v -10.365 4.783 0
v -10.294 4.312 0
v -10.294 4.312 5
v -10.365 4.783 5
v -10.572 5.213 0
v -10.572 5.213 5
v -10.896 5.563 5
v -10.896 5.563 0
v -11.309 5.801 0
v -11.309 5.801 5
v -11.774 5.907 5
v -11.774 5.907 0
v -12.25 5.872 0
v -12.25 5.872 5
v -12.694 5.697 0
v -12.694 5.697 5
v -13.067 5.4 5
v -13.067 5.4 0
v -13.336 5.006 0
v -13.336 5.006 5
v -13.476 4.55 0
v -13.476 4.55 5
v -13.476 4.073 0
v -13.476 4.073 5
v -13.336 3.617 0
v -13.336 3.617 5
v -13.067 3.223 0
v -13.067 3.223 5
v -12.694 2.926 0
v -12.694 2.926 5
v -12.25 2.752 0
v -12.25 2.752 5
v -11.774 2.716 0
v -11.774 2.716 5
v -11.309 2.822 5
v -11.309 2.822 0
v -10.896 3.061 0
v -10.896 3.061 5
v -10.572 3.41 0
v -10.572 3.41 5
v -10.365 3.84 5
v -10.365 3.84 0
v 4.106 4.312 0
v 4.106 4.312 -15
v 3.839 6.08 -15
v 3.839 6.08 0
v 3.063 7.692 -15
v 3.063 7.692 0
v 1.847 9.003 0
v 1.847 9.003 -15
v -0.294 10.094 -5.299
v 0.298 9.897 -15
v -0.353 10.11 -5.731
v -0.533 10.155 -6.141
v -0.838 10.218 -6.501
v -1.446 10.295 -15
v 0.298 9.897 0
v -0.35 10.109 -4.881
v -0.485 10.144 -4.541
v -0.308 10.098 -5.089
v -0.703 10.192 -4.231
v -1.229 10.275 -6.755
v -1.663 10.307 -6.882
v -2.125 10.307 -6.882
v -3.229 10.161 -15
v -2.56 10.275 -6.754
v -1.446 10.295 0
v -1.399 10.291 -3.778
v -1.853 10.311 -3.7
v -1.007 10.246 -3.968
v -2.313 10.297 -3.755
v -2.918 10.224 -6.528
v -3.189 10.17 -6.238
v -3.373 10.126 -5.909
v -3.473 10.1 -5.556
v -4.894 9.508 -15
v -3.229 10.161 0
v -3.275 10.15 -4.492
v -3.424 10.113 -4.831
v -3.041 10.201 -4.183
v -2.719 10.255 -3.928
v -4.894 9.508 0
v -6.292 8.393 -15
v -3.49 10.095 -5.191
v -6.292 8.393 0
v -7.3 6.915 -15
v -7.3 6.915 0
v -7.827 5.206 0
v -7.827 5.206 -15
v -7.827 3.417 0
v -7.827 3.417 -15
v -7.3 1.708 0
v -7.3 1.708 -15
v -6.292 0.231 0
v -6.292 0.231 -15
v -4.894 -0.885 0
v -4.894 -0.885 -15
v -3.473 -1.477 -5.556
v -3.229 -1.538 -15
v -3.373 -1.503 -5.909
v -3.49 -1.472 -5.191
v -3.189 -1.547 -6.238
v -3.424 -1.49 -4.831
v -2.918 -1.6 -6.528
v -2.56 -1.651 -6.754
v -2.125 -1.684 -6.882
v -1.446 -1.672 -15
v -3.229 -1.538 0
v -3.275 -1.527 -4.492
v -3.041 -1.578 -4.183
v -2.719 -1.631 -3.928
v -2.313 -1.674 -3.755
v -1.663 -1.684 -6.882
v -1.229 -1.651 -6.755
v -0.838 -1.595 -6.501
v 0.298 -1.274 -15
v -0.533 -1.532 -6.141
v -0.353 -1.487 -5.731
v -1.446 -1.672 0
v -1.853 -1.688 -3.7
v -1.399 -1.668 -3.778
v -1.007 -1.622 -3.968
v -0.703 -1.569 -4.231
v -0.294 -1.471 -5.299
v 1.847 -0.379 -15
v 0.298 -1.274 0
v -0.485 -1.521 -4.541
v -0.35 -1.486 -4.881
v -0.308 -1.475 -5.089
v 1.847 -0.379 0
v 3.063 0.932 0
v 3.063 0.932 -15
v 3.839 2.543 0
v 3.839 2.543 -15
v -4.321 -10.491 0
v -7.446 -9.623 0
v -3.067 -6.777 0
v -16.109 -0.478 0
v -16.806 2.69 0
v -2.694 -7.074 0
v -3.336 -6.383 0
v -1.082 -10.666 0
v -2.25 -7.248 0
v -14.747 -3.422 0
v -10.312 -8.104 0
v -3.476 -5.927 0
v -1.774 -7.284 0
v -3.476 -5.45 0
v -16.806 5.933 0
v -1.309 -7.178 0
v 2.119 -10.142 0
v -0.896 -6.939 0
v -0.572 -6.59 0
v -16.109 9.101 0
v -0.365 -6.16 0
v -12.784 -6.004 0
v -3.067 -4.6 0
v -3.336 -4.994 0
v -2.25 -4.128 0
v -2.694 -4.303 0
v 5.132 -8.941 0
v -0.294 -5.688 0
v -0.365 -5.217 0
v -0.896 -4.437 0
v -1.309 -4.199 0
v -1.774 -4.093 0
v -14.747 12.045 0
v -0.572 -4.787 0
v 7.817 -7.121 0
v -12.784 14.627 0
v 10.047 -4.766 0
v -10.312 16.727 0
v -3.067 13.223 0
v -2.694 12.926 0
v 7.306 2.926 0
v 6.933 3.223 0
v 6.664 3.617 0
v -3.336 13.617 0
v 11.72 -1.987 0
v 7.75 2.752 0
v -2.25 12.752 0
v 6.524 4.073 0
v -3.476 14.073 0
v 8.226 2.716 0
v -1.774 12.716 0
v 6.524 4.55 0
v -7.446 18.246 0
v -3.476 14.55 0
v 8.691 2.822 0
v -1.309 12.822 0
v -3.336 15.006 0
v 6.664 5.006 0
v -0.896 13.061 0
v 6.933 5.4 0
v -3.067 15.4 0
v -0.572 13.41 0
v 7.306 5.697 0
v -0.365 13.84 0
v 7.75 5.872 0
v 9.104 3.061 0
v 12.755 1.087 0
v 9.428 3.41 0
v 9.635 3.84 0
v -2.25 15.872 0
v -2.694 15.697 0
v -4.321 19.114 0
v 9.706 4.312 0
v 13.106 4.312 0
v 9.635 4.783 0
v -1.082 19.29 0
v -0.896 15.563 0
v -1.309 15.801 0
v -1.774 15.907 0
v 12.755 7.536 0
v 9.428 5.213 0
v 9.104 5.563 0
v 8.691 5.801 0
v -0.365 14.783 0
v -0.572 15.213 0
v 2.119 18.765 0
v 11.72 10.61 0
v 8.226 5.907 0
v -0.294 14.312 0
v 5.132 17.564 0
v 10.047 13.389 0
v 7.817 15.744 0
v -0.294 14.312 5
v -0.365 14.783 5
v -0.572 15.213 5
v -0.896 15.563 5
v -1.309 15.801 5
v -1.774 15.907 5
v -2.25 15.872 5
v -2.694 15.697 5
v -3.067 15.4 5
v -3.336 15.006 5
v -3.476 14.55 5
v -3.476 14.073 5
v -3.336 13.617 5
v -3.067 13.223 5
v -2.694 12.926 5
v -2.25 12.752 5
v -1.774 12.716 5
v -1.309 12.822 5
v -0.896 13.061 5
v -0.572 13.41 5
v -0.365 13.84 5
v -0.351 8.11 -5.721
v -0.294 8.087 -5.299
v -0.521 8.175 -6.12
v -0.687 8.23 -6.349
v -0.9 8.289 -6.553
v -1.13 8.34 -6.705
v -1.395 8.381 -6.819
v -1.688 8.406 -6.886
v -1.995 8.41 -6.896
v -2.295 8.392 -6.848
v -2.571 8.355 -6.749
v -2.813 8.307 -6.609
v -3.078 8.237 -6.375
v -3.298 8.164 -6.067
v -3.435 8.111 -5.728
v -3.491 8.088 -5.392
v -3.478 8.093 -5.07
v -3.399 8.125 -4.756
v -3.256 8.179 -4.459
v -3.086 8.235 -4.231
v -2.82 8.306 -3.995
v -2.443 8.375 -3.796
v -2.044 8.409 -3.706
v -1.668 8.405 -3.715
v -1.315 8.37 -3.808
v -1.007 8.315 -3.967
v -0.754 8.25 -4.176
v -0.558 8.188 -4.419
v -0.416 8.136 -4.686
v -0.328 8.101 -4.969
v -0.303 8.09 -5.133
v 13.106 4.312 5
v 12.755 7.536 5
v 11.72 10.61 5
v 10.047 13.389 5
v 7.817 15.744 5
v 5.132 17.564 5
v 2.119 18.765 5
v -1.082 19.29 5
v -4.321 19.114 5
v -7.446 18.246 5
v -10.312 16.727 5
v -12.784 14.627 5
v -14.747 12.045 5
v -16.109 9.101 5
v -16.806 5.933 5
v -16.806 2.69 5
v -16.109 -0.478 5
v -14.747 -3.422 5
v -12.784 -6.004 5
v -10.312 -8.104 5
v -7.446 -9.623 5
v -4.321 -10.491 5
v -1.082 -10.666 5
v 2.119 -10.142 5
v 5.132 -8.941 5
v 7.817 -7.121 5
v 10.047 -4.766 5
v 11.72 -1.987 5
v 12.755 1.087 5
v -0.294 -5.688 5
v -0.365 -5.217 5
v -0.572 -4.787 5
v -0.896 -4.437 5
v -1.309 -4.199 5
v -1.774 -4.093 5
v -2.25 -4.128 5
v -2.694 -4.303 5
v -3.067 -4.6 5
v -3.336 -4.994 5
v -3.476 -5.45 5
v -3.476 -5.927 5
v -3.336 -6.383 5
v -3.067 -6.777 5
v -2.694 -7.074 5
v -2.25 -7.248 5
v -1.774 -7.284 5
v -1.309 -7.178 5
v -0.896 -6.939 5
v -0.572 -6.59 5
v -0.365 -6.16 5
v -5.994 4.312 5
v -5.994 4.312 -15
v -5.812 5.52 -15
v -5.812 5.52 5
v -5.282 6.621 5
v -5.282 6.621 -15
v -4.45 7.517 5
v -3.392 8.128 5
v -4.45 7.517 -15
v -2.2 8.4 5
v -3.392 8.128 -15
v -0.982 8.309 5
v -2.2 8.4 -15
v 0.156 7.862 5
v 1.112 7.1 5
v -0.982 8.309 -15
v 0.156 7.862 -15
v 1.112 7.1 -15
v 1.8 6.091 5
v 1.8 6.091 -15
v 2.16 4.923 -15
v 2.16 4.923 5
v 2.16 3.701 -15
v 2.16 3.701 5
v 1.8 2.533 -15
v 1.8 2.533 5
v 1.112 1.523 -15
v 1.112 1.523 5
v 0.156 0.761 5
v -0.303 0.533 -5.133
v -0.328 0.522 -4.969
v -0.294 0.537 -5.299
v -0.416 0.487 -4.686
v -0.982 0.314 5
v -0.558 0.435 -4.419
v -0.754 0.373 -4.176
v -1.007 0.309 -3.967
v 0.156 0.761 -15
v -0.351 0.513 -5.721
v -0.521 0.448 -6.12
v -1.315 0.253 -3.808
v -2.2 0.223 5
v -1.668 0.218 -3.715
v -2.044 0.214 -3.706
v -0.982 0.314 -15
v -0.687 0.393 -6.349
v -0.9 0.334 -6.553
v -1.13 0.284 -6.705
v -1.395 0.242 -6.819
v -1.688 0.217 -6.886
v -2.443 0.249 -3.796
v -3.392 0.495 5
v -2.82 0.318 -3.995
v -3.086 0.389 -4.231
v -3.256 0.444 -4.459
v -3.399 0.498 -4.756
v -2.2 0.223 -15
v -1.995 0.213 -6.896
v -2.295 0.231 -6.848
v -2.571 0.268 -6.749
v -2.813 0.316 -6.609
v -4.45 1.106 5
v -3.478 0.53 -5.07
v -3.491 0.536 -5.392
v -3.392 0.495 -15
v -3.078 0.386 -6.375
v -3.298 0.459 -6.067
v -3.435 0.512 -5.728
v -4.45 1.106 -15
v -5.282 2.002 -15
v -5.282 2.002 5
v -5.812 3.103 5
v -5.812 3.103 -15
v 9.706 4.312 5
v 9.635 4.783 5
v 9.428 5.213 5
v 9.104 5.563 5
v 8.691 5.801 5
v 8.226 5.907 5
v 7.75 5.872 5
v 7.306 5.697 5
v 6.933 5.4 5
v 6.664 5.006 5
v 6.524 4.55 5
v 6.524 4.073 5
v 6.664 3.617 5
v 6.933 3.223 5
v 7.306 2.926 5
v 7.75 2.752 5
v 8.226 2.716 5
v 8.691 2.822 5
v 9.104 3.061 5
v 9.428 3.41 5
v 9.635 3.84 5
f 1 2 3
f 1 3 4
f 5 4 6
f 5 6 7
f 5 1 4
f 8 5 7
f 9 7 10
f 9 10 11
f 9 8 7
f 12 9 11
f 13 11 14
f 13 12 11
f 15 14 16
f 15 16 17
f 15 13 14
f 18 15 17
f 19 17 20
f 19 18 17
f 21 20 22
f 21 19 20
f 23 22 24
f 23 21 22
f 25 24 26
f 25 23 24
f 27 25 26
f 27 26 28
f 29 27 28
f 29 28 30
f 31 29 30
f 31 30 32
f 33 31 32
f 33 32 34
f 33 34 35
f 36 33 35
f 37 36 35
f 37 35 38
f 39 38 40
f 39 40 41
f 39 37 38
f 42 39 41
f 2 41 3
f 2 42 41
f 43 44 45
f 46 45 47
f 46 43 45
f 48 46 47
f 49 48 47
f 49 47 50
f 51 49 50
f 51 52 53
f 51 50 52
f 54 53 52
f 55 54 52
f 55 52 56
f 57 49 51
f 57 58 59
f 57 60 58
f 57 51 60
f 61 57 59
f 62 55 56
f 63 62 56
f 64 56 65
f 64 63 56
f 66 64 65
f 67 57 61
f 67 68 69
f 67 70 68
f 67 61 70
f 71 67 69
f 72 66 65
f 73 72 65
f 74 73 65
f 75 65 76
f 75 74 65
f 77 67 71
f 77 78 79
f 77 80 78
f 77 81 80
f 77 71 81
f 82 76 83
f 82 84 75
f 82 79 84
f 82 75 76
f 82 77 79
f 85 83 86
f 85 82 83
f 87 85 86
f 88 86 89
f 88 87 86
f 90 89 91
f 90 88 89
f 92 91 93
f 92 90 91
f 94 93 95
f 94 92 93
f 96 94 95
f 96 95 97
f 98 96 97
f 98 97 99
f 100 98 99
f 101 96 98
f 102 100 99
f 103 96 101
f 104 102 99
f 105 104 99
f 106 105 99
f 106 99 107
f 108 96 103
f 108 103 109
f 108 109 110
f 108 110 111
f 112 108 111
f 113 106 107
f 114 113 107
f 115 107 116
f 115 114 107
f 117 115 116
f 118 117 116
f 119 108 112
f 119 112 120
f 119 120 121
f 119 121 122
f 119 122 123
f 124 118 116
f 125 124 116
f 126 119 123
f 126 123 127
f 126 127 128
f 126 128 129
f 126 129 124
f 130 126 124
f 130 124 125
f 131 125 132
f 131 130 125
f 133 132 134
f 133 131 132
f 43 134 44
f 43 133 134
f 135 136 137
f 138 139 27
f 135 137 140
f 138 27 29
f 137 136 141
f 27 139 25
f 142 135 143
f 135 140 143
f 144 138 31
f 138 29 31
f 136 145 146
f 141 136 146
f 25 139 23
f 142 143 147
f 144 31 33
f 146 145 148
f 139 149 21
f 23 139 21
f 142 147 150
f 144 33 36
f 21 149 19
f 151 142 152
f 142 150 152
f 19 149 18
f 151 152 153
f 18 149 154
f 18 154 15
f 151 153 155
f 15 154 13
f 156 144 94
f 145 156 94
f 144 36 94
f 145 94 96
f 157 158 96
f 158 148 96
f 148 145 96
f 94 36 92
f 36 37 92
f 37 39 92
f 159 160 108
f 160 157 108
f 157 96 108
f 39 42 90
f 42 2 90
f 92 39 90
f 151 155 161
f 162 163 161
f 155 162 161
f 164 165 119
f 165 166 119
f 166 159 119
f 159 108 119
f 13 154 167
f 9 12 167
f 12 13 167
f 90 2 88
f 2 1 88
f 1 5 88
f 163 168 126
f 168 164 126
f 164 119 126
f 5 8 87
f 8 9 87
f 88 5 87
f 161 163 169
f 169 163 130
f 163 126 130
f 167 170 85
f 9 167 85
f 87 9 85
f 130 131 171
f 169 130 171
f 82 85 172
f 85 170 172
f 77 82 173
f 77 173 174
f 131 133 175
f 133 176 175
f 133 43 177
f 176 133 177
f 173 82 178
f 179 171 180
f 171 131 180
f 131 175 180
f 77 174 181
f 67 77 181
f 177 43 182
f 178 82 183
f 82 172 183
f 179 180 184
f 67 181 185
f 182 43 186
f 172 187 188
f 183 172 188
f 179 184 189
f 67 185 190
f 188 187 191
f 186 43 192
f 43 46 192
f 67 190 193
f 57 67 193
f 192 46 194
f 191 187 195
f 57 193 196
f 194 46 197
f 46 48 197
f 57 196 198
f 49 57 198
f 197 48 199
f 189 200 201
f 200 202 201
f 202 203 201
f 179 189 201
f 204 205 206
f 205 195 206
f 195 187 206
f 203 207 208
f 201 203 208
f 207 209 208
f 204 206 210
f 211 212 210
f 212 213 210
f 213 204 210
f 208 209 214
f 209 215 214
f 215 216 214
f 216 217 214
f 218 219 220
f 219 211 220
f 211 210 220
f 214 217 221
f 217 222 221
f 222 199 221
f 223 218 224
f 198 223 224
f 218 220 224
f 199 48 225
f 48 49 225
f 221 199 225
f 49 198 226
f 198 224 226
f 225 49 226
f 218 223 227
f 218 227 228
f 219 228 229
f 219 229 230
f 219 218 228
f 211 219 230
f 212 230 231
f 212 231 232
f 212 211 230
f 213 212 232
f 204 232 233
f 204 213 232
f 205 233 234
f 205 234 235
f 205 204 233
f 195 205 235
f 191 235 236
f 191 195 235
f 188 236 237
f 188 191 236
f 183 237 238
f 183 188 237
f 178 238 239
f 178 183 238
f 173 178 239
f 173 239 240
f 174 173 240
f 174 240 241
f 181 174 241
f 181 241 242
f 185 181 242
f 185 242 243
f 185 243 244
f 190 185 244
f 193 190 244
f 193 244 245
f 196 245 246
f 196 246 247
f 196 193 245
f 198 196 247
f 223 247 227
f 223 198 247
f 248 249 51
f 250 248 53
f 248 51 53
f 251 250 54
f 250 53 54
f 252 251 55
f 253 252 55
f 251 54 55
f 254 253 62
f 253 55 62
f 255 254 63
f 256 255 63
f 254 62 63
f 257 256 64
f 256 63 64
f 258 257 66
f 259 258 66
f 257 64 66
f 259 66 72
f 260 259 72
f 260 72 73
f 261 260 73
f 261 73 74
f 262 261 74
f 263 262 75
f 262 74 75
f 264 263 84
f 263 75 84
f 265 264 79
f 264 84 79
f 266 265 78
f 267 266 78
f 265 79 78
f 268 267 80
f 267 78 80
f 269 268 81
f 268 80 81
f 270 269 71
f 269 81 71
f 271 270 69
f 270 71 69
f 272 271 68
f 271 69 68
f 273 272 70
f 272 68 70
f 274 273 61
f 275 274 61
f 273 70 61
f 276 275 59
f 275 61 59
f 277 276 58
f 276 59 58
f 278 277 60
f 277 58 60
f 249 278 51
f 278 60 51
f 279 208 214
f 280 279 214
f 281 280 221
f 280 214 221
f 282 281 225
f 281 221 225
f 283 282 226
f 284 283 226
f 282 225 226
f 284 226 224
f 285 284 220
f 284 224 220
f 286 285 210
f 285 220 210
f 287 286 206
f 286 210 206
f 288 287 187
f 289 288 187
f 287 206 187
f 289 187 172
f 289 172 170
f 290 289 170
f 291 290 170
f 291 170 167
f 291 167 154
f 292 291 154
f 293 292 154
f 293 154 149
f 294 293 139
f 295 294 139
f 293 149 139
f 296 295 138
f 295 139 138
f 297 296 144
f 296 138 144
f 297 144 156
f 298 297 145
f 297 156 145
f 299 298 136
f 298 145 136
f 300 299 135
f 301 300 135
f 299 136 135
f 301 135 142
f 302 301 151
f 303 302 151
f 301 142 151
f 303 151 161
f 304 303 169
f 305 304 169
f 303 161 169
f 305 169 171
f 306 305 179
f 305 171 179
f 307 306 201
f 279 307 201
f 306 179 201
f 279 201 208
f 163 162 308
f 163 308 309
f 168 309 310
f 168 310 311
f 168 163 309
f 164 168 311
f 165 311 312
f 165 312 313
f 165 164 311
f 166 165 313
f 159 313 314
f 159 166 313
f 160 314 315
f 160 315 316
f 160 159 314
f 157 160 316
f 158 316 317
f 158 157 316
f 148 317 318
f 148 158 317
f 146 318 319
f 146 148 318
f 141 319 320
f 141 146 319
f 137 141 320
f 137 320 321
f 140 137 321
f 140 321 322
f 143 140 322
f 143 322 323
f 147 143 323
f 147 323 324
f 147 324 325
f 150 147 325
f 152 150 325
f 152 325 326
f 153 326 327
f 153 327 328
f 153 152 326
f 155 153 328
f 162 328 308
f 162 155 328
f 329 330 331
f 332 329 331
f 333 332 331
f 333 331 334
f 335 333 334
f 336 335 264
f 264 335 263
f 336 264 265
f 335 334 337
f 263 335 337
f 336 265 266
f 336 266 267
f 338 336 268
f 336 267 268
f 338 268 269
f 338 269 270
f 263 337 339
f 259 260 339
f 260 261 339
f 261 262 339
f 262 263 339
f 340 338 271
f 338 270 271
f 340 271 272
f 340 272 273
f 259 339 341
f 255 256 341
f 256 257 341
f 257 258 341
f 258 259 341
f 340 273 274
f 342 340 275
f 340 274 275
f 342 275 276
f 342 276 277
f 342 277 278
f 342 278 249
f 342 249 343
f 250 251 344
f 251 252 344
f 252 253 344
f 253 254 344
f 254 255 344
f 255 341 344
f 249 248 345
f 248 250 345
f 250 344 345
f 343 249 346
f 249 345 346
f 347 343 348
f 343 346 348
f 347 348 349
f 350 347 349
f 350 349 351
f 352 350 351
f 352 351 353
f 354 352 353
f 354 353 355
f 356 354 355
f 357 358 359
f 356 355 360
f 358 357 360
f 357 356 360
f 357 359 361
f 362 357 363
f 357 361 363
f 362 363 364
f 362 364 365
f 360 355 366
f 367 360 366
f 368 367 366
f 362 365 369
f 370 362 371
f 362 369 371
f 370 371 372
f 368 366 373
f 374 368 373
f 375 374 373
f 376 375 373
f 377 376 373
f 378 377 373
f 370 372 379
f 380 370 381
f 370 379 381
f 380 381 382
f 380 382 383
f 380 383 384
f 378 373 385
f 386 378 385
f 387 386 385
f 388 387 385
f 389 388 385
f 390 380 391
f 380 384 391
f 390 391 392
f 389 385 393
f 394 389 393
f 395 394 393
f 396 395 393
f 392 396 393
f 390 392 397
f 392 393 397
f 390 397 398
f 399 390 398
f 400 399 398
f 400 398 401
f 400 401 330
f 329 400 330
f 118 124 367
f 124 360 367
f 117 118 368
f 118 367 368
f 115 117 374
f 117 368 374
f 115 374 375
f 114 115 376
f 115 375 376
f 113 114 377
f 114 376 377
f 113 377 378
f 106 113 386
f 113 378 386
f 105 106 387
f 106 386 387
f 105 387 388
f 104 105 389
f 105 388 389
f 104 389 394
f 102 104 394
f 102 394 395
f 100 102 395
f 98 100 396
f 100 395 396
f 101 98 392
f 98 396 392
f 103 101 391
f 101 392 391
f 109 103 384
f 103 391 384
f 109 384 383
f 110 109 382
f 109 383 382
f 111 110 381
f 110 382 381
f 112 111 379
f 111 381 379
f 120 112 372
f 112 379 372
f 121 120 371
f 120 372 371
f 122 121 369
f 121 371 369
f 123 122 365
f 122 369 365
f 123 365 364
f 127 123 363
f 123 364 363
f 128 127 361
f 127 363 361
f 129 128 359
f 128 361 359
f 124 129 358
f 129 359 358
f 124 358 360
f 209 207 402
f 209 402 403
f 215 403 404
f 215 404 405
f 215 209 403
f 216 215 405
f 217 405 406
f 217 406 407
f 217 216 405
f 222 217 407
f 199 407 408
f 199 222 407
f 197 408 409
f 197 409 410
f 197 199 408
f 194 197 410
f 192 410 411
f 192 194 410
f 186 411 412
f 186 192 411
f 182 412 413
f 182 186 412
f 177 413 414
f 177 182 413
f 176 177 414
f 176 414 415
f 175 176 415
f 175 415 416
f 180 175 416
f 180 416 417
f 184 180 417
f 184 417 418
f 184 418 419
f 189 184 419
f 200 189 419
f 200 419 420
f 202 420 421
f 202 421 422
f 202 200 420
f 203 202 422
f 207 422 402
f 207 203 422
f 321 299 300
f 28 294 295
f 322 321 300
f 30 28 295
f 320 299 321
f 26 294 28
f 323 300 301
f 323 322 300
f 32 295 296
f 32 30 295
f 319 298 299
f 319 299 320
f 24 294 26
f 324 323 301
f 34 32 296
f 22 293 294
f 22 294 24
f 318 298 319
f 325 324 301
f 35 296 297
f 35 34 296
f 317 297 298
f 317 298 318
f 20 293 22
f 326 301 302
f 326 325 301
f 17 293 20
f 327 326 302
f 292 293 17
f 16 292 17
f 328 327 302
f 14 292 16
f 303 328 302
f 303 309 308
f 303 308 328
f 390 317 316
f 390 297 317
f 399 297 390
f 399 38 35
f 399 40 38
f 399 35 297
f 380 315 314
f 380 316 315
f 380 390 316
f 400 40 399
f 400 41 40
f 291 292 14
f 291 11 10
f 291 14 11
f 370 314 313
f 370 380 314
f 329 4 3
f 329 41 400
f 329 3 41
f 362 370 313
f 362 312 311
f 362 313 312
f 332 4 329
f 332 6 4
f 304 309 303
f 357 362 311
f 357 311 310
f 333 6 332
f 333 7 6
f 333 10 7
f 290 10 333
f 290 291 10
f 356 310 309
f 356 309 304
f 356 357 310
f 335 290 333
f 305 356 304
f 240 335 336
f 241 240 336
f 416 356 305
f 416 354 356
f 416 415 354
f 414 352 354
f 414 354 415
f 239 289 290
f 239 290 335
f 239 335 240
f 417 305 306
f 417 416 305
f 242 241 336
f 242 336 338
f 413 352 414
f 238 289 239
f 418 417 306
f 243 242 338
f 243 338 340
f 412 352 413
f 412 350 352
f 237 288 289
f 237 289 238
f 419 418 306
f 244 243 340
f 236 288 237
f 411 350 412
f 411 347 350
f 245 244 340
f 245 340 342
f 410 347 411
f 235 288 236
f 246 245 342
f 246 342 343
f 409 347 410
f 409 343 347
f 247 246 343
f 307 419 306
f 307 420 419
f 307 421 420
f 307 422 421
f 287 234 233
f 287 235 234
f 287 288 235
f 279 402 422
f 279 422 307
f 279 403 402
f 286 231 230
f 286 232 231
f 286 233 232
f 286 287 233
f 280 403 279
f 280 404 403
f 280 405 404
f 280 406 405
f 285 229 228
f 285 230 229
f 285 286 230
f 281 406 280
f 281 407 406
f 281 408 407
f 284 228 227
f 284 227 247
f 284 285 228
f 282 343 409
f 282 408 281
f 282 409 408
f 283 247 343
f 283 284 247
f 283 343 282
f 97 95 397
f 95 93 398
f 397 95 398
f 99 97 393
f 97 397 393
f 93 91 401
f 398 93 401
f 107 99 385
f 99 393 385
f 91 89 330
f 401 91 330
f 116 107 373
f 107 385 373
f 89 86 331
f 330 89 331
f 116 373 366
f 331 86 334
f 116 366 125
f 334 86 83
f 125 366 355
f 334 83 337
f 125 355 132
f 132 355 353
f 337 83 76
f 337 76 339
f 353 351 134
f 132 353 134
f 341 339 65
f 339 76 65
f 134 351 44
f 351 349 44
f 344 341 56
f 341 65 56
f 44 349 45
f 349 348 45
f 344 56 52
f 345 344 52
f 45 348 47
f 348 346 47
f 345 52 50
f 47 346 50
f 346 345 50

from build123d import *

# Parameters (mm, degrees)
SKETCH_1_R          = 15
SKETCH_1_R_2        = 1.6
EXTRUDE_1_DEPTH     = 5
SKETCH_2_R          = 6
EXTRUDE_2_DEPTH     = 15
SKETCH_3_R          = 4.1
CUT_EXTRUDE_1_DEPTH = 21
SKETCH_4_R          = 1.6
CUT_EXTRUDE_2_DEPTH = 15


with BuildPart() as part:
    # 草图1 → 凸台-拉伸1 (new body)
    with BuildSketch(Plane.XY):
        with Locations((-1.893979513, 4.311637078)):
            Circle(SKETCH_1_R)
        with Locations((-1.893979513, 14.311637078)):
            Circle(SKETCH_1_R_2, mode=Mode.SUBTRACT)
        with Locations((8.106020487, 4.311637078)):
            Circle(SKETCH_1_R_2, mode=Mode.SUBTRACT)
        with Locations((-1.893979513, -5.688362922)):
            Circle(SKETCH_1_R_2, mode=Mode.SUBTRACT)
        with Locations((-11.893979513, 4.311637078)):
            Circle(SKETCH_1_R_2, mode=Mode.SUBTRACT)
    extrude(amount=EXTRUDE_1_DEPTH)

    # 草图2 → 凸台-拉伸2 (add)
    with BuildSketch(Plane.XY):
        with Locations((-1.893979513, 4.311637078)):
            Circle(SKETCH_2_R)
    extrude(amount=-EXTRUDE_2_DEPTH)

    # 草图3 → 切除-拉伸1 (cut, through all)
    with BuildSketch(Plane(origin=(0, 0, -15), x_dir=(-1, 0, 0), z_dir=(0, 0, -1))):
        with Locations((1.893979513, 4.311637078)):
            Circle(SKETCH_3_R)
    extrude(amount=-CUT_EXTRUDE_1_DEPTH, mode=Mode.SUBTRACT)

    # 草图4 → 切除-拉伸2 (cut, symmetric)
    with BuildSketch(Plane(origin=(0, 0, 0), x_dir=(1, 0, 0), z_dir=(0, 1, 0))):
        with Locations((-1.893979513, 5.299041656)):
            Circle(SKETCH_4_R)
    extrude(amount=CUT_EXTRUDE_2_DEPTH, both=True, mode=Mode.SUBTRACT)


solid = part.part
